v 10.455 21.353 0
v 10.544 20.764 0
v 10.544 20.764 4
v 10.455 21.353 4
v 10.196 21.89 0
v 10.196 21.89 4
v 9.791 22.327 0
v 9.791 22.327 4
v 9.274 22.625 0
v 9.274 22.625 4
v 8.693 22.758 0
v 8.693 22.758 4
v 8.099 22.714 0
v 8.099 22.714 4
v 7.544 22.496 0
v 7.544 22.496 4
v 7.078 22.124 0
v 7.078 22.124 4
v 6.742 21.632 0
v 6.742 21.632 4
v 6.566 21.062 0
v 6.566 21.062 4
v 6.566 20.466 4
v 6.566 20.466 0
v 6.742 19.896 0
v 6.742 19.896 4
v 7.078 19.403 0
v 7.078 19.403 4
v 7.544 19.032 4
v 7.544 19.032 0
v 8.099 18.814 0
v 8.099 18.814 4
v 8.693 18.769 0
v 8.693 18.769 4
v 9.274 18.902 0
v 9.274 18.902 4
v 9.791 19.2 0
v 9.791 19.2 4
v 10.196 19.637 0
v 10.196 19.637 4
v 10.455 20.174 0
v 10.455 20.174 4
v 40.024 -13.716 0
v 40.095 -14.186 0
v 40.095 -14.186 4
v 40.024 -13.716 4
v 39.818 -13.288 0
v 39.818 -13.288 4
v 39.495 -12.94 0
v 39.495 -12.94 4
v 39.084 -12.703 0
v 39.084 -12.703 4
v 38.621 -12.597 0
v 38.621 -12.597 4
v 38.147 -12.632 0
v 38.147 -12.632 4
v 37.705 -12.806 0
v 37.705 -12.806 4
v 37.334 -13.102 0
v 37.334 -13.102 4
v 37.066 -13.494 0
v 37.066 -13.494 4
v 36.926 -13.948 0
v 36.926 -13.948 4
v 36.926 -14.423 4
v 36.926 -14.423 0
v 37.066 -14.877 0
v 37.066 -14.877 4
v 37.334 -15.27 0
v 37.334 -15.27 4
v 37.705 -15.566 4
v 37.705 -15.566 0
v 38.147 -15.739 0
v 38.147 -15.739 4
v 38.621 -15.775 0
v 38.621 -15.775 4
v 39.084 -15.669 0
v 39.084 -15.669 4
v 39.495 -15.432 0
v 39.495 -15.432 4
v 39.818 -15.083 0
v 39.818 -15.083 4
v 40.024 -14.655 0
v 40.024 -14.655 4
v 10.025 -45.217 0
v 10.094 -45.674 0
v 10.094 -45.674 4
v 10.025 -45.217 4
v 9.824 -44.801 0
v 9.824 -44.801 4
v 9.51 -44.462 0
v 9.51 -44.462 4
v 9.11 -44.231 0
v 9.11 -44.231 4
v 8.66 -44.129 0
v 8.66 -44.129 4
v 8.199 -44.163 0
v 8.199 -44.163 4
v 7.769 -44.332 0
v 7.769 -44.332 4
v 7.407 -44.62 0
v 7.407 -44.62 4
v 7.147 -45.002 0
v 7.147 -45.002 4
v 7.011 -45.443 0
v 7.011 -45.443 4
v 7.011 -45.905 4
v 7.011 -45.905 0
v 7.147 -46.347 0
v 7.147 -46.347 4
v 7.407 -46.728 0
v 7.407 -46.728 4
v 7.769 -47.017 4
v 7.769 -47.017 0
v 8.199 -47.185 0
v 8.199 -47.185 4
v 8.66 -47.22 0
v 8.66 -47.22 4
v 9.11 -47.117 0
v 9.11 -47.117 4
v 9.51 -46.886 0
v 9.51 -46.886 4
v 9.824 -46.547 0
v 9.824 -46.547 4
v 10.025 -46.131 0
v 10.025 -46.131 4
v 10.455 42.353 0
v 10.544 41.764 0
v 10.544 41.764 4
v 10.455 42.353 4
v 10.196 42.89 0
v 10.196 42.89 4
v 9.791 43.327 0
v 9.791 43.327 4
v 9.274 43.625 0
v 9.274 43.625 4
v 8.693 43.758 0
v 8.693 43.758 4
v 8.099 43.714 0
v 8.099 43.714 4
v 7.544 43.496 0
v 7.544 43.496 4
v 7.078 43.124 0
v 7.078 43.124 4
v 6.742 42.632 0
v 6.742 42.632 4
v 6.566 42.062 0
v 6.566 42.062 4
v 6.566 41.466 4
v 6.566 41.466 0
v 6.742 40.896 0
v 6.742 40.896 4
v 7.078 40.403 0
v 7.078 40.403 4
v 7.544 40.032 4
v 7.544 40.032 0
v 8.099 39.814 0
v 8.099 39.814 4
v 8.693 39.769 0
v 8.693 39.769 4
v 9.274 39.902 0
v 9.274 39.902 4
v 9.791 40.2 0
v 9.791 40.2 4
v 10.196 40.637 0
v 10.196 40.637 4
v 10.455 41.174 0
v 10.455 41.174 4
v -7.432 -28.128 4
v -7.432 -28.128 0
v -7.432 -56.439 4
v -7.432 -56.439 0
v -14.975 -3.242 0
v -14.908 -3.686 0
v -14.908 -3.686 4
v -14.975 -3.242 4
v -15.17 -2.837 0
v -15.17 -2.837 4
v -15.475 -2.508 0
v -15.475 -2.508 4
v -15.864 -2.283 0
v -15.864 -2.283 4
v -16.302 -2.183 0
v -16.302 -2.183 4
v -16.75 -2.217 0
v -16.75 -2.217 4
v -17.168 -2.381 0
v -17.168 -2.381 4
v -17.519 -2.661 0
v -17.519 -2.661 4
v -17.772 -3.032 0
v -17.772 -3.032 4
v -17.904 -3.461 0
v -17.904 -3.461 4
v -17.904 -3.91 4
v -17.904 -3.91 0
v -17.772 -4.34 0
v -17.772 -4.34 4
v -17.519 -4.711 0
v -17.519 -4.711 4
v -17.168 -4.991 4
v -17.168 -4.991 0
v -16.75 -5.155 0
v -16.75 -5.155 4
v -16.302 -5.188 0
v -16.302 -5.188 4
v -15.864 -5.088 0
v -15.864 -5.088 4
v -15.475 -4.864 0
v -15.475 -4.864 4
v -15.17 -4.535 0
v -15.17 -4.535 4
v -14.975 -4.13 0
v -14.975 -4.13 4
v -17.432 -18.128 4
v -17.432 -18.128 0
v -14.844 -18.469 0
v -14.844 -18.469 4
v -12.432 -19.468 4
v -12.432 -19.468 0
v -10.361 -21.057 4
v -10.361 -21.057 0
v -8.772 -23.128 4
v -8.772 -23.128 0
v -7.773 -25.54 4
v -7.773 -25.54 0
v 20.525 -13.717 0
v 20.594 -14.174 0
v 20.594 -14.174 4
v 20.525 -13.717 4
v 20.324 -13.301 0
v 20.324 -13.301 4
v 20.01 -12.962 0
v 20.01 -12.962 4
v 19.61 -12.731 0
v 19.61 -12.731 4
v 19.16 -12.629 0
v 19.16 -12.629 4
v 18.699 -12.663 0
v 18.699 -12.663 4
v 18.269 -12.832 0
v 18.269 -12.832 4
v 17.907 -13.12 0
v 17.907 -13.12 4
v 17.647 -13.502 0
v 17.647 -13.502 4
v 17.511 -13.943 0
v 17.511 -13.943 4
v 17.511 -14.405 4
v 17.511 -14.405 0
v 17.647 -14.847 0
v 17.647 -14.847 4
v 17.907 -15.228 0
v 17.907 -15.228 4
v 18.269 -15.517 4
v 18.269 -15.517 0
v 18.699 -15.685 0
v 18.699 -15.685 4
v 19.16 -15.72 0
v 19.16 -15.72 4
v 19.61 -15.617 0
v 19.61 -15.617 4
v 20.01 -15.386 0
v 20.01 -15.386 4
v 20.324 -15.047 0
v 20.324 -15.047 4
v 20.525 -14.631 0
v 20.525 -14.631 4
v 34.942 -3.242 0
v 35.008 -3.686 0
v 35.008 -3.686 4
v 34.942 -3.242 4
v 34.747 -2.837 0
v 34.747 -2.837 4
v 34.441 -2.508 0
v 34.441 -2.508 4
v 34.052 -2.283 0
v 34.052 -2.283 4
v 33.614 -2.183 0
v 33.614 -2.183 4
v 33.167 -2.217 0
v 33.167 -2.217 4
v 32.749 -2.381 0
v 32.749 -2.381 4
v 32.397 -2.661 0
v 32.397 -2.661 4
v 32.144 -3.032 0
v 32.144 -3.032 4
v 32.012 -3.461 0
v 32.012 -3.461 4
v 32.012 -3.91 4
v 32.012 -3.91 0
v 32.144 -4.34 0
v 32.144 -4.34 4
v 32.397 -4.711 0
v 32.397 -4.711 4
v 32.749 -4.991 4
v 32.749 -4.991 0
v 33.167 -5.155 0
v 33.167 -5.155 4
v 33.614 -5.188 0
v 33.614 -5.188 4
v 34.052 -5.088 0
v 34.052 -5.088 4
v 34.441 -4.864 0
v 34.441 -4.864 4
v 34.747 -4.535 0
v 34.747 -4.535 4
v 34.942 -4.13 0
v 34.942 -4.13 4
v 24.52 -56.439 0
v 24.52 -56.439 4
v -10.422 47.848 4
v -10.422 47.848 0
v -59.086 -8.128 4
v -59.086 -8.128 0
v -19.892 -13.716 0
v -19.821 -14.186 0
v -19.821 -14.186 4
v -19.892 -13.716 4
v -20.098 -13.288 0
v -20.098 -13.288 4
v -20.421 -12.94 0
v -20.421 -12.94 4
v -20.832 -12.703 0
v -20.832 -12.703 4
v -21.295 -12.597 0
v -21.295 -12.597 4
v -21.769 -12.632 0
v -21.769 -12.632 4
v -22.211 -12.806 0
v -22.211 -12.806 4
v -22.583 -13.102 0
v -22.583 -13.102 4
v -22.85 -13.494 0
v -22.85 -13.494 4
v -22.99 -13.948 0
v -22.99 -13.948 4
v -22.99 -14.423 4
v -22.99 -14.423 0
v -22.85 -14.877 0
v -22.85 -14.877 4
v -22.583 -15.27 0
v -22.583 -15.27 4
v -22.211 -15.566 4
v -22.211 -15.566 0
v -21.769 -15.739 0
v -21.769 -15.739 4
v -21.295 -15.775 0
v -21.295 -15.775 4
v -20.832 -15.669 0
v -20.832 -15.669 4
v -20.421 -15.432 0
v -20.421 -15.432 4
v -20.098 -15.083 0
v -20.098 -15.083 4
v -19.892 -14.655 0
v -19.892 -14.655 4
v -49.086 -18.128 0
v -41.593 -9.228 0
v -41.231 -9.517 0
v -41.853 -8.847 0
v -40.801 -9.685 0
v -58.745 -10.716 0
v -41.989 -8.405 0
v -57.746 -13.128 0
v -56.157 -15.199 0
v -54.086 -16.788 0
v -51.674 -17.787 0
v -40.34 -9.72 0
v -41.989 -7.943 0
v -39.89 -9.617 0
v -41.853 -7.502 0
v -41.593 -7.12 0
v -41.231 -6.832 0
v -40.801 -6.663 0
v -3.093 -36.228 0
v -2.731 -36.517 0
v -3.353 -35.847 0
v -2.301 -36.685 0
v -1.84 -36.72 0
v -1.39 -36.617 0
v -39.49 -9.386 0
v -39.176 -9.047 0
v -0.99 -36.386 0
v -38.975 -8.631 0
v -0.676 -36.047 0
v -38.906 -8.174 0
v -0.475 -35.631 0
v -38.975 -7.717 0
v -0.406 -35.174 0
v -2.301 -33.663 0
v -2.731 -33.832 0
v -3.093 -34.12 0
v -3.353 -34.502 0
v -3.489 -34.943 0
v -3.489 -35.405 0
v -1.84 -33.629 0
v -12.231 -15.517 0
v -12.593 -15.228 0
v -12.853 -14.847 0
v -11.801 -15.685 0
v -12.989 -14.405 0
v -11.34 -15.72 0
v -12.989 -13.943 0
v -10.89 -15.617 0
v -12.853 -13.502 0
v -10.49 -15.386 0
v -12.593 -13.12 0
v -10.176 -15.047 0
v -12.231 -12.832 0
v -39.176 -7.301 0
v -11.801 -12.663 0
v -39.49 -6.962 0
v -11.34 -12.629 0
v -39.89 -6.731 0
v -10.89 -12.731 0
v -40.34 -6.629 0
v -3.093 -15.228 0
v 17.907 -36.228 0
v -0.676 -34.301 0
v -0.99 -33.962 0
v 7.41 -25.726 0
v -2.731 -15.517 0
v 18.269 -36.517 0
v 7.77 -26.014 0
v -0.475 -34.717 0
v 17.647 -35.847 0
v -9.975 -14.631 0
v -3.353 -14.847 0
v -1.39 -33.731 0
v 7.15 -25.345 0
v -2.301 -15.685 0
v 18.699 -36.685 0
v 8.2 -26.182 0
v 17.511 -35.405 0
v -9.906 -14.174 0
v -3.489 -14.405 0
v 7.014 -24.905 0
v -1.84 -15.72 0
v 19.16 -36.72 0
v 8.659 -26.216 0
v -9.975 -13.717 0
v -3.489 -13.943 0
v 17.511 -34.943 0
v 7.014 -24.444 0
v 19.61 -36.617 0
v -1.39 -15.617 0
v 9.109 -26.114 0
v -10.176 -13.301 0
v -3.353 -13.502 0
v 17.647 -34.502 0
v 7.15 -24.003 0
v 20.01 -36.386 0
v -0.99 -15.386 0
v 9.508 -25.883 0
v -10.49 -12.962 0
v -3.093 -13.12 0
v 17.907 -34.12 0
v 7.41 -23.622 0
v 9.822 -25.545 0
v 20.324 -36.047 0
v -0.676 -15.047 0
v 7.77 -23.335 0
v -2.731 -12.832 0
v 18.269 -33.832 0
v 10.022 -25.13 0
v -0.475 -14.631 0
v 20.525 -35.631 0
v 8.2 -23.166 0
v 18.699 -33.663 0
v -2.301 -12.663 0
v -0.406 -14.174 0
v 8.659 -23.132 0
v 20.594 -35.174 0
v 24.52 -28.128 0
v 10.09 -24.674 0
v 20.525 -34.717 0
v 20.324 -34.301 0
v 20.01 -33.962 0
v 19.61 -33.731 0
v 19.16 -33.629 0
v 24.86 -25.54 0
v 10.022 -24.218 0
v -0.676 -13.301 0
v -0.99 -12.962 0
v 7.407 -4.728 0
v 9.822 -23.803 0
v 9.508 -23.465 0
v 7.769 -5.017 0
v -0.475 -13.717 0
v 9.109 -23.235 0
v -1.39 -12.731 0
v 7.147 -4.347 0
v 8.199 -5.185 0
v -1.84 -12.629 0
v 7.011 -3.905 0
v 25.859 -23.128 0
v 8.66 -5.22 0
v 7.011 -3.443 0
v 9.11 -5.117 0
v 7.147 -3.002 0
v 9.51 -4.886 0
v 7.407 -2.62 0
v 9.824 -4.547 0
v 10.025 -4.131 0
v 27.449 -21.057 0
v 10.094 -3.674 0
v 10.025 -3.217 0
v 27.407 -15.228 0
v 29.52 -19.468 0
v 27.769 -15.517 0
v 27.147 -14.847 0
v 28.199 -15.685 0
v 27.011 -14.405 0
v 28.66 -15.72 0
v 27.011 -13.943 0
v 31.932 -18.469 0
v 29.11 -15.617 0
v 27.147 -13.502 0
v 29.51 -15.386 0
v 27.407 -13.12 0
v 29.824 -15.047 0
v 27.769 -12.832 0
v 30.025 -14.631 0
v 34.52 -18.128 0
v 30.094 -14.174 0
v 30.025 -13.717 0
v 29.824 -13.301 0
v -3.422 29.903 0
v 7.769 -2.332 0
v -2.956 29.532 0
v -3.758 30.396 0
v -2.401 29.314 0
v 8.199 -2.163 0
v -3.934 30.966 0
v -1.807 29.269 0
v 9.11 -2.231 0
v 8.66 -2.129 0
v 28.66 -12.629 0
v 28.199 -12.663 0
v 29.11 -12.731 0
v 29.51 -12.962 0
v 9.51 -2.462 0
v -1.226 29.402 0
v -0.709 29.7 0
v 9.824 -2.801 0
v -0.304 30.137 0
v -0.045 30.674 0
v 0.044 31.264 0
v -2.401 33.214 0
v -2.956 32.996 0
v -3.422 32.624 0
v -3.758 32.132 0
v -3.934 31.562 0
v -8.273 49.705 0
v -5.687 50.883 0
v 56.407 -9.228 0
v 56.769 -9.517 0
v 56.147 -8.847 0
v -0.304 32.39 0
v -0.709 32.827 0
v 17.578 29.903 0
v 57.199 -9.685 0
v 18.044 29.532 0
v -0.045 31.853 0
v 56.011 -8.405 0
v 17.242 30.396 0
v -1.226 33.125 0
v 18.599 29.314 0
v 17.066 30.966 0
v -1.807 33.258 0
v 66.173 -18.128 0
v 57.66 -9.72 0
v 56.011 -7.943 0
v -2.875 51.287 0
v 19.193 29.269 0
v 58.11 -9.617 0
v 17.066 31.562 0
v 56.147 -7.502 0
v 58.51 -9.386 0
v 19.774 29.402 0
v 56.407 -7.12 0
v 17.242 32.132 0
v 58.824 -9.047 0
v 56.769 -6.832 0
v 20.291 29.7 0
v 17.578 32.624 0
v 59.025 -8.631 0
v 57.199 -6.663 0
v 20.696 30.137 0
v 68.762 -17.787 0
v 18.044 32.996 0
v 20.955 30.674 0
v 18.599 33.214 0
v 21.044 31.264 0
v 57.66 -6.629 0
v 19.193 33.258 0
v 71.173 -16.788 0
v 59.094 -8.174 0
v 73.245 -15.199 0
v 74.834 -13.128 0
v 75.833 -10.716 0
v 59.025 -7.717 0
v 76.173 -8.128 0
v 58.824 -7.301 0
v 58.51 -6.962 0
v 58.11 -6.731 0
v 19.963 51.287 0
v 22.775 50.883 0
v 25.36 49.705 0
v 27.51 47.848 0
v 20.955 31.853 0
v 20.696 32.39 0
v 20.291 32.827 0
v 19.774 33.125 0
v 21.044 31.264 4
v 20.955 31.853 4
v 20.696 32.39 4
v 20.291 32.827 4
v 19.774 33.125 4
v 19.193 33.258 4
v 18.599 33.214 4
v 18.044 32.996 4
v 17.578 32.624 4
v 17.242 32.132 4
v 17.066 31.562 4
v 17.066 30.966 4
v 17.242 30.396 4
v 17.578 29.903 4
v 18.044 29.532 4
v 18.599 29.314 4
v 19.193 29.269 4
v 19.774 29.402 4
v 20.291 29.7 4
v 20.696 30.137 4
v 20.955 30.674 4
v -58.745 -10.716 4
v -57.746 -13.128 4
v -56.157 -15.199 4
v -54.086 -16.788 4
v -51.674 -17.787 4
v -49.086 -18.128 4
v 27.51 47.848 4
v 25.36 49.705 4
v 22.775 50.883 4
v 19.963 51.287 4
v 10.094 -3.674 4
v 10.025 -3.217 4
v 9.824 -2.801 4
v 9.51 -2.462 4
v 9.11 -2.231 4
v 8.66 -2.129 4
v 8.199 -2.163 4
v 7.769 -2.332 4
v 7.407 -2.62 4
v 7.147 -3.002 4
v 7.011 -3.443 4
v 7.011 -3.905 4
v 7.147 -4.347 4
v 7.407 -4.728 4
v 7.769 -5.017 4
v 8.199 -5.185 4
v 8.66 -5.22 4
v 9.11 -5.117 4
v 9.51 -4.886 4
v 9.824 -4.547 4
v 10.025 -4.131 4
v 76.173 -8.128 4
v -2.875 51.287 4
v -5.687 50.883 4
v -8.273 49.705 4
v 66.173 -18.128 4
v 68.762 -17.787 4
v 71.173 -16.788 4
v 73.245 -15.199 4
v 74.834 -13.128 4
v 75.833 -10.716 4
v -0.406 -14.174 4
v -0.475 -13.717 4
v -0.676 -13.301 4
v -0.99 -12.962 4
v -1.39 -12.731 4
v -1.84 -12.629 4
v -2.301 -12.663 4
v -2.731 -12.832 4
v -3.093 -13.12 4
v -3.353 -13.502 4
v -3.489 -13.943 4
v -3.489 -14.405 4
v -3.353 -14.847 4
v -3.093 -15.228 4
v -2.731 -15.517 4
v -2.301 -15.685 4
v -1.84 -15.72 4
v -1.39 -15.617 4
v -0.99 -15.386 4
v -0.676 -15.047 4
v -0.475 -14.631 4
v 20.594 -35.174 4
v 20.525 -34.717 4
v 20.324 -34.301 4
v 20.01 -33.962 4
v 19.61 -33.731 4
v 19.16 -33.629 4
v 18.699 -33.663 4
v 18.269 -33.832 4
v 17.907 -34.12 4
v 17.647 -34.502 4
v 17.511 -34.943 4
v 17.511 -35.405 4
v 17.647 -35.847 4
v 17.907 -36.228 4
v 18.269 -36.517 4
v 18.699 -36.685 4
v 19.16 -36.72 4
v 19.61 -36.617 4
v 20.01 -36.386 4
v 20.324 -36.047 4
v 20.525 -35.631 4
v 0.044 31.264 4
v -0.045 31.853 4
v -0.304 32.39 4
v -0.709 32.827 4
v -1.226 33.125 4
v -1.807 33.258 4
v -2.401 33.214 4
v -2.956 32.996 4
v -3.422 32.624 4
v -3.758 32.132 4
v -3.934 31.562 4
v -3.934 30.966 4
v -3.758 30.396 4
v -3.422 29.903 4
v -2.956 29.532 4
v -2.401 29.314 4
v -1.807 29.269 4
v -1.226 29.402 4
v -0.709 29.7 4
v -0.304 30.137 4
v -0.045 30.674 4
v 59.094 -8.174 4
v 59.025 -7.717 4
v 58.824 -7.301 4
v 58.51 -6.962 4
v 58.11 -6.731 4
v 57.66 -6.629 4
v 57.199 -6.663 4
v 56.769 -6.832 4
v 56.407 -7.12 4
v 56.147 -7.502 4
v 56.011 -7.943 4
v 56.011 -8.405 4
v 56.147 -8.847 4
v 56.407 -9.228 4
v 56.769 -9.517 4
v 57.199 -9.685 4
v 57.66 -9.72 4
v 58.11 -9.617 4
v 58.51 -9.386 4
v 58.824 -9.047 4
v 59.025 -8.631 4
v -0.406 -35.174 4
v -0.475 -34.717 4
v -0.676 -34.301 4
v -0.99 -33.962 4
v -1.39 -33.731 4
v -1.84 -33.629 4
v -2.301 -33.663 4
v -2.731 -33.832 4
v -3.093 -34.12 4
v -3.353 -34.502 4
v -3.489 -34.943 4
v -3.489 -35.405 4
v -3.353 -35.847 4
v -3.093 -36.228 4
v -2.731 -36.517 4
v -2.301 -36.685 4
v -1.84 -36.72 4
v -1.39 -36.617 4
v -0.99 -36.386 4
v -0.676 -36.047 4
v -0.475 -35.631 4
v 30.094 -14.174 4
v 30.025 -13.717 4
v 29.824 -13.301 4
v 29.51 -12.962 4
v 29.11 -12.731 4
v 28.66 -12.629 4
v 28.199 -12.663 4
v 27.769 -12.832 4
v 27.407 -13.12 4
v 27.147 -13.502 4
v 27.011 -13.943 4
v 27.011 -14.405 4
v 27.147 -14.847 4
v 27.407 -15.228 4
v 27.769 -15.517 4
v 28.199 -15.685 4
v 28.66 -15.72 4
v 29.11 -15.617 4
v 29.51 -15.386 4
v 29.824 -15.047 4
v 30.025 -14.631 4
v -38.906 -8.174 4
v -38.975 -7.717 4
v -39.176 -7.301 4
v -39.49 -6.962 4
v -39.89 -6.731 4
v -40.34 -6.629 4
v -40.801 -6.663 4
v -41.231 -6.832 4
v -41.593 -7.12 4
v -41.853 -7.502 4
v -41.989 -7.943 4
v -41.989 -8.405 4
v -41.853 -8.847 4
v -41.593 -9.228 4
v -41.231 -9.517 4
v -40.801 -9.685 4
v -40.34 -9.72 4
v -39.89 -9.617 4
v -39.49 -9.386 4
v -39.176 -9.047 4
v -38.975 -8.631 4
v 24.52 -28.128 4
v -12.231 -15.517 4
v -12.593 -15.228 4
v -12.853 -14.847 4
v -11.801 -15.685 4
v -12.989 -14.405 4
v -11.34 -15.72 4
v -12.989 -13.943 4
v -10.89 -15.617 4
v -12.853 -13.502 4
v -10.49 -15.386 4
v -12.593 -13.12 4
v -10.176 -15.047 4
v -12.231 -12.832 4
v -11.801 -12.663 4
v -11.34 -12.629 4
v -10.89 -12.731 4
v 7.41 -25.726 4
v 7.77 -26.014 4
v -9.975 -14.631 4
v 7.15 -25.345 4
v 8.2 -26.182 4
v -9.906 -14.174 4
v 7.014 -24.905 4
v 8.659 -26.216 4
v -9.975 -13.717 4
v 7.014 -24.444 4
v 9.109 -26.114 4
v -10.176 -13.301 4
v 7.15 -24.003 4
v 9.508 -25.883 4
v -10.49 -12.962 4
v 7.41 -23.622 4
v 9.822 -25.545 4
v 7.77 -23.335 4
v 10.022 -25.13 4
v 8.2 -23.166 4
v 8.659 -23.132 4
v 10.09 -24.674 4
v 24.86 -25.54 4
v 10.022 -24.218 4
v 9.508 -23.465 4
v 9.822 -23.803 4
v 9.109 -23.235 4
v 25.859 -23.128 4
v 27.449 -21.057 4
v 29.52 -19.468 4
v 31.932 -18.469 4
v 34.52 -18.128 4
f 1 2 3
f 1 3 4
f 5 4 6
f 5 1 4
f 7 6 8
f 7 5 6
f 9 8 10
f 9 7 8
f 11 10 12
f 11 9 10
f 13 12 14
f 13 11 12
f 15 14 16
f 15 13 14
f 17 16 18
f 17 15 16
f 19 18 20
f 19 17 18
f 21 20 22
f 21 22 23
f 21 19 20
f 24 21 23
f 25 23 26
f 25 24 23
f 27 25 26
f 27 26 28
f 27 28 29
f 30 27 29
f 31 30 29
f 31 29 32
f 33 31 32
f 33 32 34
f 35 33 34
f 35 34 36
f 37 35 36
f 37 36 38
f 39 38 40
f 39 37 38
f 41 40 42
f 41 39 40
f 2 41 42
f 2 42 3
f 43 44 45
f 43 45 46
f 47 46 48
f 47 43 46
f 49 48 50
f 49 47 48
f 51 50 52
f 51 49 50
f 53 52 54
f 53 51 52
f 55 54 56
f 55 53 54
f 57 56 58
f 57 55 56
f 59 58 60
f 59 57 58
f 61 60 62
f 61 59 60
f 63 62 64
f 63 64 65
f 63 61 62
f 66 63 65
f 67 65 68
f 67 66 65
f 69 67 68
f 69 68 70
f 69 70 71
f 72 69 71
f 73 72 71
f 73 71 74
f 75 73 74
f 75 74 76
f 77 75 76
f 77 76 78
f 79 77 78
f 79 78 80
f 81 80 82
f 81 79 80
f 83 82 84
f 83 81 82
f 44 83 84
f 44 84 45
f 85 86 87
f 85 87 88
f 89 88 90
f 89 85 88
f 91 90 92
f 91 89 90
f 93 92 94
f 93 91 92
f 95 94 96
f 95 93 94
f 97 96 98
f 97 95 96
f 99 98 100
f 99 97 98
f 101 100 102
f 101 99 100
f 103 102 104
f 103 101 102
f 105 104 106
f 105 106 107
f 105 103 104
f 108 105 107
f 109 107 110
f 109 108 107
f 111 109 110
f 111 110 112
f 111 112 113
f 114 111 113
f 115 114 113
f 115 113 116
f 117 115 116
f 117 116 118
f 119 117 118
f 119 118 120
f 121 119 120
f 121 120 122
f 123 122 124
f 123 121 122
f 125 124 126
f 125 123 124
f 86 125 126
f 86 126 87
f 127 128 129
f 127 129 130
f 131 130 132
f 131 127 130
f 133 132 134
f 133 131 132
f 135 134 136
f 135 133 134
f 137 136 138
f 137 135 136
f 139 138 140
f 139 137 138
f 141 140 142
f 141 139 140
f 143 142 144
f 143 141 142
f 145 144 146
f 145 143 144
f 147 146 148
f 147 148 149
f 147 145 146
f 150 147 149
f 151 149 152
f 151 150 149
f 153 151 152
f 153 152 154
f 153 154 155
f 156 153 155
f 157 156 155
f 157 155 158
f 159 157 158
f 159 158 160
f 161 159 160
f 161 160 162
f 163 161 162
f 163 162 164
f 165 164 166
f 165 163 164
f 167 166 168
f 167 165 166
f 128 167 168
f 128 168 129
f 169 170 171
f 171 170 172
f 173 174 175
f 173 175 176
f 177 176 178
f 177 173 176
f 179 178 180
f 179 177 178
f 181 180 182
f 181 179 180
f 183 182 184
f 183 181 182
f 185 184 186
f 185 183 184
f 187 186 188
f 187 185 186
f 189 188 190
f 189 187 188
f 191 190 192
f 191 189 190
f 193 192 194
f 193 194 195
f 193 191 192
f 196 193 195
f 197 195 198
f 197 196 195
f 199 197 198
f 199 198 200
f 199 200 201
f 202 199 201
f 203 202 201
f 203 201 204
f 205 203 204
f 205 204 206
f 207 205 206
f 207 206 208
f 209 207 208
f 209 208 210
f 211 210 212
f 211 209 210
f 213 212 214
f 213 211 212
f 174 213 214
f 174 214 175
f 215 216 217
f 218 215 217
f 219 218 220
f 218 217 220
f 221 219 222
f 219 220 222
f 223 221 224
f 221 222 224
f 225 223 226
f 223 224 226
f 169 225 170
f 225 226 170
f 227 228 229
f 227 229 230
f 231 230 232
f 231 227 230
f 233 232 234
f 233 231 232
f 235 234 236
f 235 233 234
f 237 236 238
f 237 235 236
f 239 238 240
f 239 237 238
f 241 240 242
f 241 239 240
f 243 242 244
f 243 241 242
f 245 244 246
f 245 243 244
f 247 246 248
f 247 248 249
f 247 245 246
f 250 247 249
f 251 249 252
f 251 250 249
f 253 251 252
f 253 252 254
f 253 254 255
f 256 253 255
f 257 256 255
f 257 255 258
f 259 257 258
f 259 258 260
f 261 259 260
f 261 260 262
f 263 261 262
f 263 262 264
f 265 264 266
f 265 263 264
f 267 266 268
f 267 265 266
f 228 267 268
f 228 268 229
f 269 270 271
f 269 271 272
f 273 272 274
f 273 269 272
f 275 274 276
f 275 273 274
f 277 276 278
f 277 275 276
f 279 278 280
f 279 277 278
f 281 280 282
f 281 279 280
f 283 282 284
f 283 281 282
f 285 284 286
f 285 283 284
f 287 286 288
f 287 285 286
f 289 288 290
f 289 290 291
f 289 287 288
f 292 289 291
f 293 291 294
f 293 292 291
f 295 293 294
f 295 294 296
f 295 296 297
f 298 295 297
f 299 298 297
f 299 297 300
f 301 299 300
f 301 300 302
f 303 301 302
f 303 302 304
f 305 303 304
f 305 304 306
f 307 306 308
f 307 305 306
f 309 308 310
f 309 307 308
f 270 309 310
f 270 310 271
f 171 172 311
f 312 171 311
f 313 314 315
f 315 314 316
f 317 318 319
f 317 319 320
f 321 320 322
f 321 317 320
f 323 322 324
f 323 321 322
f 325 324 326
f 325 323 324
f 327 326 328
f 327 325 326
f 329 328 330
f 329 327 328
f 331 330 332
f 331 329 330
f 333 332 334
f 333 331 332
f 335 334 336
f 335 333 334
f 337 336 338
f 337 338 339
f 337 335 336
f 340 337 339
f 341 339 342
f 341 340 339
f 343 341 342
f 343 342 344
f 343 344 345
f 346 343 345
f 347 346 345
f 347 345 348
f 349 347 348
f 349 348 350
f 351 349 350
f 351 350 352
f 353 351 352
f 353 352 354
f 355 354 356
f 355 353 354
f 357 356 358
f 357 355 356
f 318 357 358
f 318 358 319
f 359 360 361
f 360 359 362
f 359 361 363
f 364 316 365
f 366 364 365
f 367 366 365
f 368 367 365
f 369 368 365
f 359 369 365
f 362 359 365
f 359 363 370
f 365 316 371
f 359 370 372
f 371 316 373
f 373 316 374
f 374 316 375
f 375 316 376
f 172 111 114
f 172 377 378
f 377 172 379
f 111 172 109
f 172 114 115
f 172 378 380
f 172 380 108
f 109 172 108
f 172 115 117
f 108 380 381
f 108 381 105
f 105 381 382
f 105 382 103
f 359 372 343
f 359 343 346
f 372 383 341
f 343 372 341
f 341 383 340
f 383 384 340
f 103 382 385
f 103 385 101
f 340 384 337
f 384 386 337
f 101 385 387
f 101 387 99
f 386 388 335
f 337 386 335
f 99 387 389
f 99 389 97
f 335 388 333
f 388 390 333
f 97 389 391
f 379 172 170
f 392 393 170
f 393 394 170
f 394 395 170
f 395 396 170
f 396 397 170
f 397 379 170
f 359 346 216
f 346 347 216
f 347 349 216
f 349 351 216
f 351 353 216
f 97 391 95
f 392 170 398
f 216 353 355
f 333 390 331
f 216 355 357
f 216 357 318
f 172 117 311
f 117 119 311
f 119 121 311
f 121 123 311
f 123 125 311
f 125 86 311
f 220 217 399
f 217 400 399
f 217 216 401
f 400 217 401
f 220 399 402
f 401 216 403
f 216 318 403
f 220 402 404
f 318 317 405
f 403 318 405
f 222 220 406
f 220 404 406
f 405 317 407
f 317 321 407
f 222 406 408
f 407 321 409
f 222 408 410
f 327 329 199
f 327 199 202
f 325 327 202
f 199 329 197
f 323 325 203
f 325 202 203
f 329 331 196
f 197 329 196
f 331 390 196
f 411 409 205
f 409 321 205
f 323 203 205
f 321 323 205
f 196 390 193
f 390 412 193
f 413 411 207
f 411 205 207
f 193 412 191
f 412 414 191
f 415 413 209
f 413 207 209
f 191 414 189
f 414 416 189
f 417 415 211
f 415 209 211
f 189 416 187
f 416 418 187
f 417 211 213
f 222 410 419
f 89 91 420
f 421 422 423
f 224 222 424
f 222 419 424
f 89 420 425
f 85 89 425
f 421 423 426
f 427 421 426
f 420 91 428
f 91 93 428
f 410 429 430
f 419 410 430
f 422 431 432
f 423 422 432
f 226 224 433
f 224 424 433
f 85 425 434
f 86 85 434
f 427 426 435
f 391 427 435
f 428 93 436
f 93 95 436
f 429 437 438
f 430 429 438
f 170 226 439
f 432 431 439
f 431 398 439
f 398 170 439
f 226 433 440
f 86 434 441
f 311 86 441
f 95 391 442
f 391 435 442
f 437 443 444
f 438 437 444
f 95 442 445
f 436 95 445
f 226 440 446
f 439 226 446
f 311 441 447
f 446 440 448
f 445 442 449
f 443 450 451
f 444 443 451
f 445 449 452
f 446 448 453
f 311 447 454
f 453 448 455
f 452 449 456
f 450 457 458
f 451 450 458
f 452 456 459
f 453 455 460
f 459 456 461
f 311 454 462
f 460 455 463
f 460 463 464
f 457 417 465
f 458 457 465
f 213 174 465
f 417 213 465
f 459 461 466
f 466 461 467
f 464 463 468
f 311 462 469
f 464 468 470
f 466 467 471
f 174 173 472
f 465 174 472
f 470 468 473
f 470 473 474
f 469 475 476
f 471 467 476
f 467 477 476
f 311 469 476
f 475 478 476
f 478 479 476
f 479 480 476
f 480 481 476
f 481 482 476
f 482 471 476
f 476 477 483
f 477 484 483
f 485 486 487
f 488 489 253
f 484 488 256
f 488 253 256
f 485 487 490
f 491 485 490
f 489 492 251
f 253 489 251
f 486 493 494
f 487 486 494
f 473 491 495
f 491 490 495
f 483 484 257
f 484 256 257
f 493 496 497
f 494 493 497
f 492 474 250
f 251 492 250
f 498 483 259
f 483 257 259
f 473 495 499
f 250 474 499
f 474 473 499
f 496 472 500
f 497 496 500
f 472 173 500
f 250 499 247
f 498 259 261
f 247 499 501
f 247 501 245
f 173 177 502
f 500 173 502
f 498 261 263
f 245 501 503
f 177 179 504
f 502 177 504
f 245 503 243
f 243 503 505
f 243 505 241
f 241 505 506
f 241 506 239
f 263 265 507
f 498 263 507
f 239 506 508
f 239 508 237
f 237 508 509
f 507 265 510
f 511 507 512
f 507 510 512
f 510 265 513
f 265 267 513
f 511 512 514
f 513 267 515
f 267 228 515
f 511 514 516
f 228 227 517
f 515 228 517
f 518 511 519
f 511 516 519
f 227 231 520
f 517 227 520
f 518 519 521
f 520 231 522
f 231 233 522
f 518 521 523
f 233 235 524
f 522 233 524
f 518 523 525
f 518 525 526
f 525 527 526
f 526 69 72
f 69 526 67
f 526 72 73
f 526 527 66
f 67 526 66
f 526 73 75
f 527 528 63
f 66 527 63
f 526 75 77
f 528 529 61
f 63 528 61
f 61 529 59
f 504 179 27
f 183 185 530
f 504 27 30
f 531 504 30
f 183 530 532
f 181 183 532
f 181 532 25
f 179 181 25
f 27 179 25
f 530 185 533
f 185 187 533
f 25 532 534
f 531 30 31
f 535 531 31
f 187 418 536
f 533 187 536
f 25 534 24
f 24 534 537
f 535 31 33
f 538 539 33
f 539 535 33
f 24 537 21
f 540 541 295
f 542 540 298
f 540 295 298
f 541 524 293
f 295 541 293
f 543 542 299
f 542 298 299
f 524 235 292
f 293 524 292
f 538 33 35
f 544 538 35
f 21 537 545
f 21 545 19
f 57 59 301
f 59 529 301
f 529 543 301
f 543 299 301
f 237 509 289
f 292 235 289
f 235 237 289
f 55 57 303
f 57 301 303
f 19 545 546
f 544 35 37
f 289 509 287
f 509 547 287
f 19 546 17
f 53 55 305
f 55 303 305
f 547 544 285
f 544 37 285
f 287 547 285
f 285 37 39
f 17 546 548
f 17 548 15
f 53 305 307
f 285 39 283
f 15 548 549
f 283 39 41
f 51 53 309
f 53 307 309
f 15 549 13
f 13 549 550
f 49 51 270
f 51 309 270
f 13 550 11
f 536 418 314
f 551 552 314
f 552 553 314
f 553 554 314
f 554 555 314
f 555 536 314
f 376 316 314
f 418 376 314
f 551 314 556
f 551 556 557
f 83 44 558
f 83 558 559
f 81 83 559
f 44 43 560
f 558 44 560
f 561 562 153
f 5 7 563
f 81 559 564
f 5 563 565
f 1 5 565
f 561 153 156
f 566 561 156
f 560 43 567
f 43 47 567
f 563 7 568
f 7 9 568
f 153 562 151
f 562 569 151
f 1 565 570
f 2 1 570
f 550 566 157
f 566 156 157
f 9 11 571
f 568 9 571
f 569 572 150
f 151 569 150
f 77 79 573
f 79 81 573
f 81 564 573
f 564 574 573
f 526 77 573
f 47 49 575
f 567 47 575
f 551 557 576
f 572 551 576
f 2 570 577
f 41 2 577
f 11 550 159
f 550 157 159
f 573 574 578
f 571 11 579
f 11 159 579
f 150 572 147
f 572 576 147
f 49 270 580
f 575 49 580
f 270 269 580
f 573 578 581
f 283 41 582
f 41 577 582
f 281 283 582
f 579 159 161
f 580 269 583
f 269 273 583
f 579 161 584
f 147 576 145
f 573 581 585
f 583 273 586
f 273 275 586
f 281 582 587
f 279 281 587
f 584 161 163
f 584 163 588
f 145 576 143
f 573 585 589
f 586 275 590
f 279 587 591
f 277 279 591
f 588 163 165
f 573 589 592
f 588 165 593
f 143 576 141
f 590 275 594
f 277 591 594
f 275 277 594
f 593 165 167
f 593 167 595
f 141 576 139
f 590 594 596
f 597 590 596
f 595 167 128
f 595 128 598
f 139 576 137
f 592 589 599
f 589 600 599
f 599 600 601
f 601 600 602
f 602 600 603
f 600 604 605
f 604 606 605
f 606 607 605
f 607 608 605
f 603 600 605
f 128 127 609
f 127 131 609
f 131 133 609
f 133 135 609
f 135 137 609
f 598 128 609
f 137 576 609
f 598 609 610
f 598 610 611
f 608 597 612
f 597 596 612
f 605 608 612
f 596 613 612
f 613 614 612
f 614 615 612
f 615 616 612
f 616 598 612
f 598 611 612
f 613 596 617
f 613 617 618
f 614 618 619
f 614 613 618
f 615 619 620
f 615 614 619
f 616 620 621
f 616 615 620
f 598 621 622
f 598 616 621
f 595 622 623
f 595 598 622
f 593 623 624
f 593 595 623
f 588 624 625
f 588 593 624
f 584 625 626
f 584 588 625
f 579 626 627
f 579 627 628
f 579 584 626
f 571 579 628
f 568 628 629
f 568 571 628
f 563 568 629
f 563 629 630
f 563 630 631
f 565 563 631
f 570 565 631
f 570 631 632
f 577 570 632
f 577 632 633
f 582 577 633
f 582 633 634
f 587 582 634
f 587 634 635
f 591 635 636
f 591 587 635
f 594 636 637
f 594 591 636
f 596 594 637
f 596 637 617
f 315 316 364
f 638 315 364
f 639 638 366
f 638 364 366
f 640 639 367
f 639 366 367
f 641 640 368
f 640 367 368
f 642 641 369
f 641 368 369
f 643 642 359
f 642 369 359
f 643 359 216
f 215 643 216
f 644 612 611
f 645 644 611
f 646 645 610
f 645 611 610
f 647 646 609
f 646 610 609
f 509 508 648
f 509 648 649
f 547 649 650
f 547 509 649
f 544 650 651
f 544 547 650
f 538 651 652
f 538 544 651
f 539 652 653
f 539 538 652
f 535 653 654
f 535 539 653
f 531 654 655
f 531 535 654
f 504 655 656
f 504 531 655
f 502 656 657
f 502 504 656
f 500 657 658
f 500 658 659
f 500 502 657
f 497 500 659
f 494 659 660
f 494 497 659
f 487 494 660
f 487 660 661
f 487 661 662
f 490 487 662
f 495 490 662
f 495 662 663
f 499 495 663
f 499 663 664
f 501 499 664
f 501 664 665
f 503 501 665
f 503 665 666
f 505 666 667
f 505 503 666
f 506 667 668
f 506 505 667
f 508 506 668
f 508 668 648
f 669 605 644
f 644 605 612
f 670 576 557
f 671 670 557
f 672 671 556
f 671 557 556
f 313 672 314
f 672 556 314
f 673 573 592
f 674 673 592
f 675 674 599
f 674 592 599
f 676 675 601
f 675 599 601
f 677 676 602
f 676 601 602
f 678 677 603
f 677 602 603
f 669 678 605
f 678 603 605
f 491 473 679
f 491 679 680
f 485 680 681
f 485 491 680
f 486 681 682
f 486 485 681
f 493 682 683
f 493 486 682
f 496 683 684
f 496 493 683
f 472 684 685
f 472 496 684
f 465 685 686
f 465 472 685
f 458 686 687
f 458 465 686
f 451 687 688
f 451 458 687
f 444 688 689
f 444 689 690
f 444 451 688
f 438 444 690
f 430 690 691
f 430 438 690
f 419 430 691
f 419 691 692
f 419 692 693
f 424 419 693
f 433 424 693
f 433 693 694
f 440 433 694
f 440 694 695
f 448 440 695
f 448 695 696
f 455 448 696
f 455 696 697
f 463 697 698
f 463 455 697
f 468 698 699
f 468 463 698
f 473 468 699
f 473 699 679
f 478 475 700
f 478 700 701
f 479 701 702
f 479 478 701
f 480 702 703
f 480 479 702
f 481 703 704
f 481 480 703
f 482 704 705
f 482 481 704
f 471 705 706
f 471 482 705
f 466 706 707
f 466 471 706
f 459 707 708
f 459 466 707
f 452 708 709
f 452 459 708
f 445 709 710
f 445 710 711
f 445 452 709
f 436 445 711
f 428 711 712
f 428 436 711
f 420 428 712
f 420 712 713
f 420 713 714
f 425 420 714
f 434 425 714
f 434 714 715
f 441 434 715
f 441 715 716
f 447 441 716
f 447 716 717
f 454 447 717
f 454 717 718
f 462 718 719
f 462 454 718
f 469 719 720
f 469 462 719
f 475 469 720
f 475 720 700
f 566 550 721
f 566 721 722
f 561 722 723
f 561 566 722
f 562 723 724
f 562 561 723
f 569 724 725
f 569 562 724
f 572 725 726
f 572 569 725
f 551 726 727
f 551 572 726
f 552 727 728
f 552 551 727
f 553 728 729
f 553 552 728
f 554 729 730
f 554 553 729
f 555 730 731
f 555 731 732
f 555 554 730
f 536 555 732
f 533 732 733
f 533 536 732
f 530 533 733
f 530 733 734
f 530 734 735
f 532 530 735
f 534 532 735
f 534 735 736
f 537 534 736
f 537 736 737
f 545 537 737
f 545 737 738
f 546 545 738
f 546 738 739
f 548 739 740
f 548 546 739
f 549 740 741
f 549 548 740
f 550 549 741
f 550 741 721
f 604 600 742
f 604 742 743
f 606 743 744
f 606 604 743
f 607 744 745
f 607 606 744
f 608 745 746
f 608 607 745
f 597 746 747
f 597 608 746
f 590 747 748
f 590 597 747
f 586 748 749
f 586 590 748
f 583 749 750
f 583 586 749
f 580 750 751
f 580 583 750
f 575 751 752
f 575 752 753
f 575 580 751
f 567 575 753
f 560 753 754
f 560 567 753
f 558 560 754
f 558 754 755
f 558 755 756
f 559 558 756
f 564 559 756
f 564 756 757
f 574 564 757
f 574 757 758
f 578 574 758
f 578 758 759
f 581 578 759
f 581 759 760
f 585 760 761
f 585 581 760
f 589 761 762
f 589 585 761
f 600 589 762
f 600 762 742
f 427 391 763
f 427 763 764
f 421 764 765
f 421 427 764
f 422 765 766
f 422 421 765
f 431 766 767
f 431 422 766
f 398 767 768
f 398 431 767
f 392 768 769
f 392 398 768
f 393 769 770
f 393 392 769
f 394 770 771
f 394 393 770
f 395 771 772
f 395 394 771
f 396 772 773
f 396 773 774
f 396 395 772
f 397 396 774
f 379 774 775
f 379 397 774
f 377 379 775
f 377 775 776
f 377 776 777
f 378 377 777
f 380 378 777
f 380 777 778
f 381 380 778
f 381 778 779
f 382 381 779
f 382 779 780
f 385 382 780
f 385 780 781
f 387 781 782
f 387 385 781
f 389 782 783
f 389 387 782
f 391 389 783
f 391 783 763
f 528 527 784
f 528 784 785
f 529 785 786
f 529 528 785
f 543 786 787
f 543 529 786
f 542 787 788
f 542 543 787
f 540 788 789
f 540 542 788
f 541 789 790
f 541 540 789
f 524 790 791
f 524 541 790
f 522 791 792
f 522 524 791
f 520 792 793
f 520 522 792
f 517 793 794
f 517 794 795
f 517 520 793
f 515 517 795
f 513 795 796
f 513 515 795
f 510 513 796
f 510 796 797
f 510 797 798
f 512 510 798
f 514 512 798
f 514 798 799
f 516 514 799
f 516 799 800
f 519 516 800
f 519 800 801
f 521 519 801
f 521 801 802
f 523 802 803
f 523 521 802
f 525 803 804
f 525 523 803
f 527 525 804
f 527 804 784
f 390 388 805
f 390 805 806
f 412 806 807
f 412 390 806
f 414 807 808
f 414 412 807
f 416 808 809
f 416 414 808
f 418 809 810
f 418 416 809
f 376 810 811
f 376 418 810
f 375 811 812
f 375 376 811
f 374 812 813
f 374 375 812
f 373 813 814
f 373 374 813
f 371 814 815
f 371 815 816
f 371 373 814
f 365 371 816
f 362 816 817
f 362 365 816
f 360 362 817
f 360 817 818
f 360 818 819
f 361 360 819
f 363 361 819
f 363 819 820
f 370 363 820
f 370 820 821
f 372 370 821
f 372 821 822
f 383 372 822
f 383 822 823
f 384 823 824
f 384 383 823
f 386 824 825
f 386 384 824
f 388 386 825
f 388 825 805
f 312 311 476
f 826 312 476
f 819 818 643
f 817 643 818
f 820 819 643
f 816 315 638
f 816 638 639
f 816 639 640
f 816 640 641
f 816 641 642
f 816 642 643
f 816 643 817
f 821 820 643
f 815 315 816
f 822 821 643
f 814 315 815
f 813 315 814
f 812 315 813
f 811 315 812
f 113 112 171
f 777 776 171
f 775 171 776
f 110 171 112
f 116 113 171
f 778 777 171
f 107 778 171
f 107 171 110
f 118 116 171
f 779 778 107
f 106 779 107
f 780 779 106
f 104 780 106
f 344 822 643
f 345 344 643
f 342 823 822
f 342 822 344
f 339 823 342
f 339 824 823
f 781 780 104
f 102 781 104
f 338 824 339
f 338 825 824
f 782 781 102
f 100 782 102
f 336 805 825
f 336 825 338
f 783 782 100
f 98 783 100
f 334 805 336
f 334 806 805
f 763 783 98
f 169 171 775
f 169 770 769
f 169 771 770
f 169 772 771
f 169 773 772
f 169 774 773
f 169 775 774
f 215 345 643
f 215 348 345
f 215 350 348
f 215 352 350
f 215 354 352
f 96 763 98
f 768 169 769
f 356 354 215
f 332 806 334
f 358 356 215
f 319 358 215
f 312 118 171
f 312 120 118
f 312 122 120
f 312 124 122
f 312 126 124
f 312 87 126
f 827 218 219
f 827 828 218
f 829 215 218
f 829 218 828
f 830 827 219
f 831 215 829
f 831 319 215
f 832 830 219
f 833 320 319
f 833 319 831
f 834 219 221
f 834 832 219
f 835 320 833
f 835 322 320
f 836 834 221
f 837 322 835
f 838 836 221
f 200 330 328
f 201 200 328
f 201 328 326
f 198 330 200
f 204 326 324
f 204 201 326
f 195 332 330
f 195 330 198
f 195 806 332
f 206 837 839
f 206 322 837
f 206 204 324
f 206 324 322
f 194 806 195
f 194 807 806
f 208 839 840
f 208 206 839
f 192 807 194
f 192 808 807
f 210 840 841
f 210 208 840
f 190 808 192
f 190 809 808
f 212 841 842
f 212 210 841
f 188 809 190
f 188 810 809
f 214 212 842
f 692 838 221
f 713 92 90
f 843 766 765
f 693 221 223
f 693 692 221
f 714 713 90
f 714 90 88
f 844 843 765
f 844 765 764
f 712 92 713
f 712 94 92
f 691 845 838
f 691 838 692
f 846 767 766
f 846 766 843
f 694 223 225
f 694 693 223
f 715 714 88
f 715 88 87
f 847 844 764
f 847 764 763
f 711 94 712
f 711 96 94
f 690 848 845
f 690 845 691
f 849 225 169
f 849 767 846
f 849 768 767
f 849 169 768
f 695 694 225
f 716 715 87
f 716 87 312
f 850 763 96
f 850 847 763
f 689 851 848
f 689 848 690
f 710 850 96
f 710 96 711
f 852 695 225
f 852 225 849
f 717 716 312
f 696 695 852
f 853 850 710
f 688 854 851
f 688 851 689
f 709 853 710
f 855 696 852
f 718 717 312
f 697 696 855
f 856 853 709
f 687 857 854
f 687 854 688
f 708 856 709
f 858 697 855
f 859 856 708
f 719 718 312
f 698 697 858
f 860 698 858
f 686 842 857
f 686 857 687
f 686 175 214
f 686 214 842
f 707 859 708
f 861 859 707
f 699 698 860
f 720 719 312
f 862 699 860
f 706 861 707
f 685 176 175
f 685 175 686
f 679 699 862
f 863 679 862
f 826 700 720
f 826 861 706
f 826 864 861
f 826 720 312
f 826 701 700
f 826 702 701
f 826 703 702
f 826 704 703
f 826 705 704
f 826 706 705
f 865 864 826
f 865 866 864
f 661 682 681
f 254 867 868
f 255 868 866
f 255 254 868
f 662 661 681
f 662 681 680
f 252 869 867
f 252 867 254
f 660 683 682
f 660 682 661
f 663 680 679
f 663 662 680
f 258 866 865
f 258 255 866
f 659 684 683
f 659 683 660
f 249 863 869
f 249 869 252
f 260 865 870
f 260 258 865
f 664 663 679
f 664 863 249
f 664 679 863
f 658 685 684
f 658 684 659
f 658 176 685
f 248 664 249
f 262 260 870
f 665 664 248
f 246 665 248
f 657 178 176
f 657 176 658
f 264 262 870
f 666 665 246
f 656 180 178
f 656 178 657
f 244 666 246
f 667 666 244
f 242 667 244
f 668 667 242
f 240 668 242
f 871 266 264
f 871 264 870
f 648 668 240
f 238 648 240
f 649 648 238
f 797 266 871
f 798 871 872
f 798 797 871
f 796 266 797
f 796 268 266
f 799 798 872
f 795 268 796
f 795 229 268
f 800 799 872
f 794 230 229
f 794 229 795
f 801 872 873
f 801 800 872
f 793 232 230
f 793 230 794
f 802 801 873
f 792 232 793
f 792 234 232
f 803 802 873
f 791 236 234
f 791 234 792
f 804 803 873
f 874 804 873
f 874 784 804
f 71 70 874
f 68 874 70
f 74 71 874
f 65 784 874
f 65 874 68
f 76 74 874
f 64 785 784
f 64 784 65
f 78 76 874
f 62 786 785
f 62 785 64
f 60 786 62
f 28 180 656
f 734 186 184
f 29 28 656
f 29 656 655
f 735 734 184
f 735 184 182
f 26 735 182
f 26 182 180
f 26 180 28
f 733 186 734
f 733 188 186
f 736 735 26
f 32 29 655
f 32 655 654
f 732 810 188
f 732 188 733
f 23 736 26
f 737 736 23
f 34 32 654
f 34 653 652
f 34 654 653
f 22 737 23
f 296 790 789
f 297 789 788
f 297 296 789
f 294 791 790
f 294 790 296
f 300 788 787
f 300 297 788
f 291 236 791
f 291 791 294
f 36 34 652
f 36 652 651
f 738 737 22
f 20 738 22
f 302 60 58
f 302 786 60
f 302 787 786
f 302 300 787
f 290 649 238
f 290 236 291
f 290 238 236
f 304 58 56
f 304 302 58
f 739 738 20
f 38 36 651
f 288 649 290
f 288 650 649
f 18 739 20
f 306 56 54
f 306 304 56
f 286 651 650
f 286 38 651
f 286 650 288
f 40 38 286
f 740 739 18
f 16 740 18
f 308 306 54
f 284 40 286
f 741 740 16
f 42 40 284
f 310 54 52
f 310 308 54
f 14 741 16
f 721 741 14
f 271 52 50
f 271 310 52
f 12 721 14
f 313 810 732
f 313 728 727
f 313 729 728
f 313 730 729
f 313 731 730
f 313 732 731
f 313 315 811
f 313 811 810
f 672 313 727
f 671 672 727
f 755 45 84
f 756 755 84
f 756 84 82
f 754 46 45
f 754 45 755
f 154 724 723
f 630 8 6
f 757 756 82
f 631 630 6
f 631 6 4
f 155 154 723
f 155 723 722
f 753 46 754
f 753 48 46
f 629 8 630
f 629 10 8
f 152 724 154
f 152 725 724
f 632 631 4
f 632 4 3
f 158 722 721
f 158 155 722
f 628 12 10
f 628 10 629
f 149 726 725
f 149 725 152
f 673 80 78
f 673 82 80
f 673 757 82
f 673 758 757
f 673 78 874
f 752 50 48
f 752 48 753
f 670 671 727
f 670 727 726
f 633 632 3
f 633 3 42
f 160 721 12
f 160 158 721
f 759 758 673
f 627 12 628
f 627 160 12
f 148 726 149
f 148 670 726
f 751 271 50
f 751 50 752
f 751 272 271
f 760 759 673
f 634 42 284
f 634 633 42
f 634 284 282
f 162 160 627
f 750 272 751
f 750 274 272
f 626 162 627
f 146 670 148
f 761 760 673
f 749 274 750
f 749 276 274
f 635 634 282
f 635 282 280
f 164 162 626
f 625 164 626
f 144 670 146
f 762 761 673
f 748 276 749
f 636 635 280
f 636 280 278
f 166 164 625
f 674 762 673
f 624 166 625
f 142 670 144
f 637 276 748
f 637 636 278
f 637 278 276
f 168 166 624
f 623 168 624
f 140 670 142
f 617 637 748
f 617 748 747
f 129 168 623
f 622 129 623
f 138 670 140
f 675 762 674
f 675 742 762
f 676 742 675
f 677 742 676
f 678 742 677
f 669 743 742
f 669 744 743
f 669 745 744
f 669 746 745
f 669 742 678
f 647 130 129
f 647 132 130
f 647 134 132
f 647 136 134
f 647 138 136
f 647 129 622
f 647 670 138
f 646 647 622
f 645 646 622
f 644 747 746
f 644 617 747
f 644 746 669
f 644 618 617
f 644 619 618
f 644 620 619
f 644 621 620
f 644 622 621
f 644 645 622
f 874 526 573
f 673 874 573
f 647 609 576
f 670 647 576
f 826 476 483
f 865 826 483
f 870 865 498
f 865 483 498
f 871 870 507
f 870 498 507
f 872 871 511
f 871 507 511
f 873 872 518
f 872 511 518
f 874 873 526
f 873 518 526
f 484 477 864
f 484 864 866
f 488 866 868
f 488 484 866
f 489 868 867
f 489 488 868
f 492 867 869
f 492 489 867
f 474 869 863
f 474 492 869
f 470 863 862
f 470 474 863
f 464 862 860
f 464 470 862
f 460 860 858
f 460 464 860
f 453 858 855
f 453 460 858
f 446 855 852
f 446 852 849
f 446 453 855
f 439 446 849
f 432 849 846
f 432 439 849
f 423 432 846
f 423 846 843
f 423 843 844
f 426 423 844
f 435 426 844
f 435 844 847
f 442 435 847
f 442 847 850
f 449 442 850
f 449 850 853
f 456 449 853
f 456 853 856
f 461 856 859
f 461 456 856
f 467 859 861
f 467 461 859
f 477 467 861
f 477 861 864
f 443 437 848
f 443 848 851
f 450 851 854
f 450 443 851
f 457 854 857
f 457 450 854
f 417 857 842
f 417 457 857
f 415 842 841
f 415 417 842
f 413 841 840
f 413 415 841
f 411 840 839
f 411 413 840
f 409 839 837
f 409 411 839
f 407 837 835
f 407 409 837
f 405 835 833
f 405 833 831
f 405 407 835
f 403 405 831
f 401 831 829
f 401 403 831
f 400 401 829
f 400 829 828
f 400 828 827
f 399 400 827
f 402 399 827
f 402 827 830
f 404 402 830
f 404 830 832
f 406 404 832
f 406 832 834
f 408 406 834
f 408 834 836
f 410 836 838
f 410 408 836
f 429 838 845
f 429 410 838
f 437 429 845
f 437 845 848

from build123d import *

# Parameters (mm, degrees)
SKETCH_1_R      = 1.55
SKETCH_1_R_2    = 1.593407699
SKETCH_1_R_3    = 1.506592301
SKETCH_1_R_4    = 1.546583653
SKETCH_1_R_5    = 2
EXTRUDE_1_DEPTH = 4


with BuildPart() as part:
    # 草图1 → 凸台-拉伸1 (new body)
    with BuildSketch(Plane.XY):
        with BuildLine():
            Line((-49.086064172, -18.127823684), (-41.682309555, -18.127823684))
            Line((-41.682309555, -18.127823684), (-17.432309555, -18.127823684))
            ThreePointArc((-17.432309555, -18.127823684), (-10.361241743, -21.056755872), (-7.432309555, -28.127823684))
            Line((-7.432309555, -28.127823684), (-7.432309555, -56.439146577))
            Line((-7.432309555, -56.439146577), (24.519698232, -56.439146577))
            Line((24.519698232, -56.439146577), (24.519698232, -28.127823684))
            ThreePointArc((24.519698232, -28.127823684), (27.44863042, -21.056755872), (34.519698232, -18.127823684))
            Line((34.519698232, -18.127823684), (58.769698232, -18.127823684))
            Line((58.769698232, -18.127823684), (66.173452848, -18.127823684))
            ThreePointArc((66.173452848, -18.127823684), (73.24452066, -15.198891495), (76.173452848, -8.127823684))
            Line((76.173452848, -8.127823684), (27.509504294, 47.847762189))
            ThreePointArc((27.509504294, 47.847762189), (24.109445562, 50.386499783), (19.962749895, 51.28677918))
            Line((19.962749895, 51.28677918), (8.543694338, 51.28677918))
            Line((8.543694338, 51.28677918), (-2.875361218, 51.28677918))
            ThreePointArc((-2.875361218, 51.28677918), (-7.022056885, 50.386499783), (-10.422115617, 47.847762189))
            Line((-10.422115617, 47.847762189), (-59.086064172, -8.127823684))
            ThreePointArc((-59.086064172, -8.127823684), (-56.157131983, -15.198891495), (-49.086064172, -18.127823684))
        make_face()
        with Locations((-1.956305662, -35.174209618)):
            Circle(SKETCH_1_R, mode=Mode.SUBTRACT)
        with Locations((-40.456305662, -8.174209618)):
            Circle(SKETCH_1_R, mode=Mode.SUBTRACT)
        with Locations((-21.414481972, -14.185828882)):
            Circle(SKETCH_1_R_2, mode=Mode.SUBTRACT)
        with Locations((-11.456305662, -14.174209618)):
            Circle(SKETCH_1_R, mode=Mode.SUBTRACT)
        with Locations((-16.414481972, -3.685828882)):
            Circle(SKETCH_1_R_3, mode=Mode.SUBTRACT)
        with Locations((-1.956305662, -14.174209618)):
            Circle(SKETCH_1_R, mode=Mode.SUBTRACT)
        with Locations((8.543694338, -45.674209618)):
            Circle(SKETCH_1_R, mode=Mode.SUBTRACT)
        with Locations((19.043694338, -35.174209618)):
            Circle(SKETCH_1_R, mode=Mode.SUBTRACT)
        with Locations((8.543694338, -24.674209618)):
            Circle(SKETCH_1_R_4, mode=Mode.SUBTRACT)
        with Locations((19.043694338, -14.174209618)):
            Circle(SKETCH_1_R, mode=Mode.SUBTRACT)
        with Locations((8.543694338, -3.674209618)):
            Circle(SKETCH_1_R, mode=Mode.SUBTRACT)
        with Locations((28.543694338, -14.174209618)):
            Circle(SKETCH_1_R, mode=Mode.SUBTRACT)
        with Locations((38.501870648, -14.185828882)):
            Circle(SKETCH_1_R_2, mode=Mode.SUBTRACT)
        with Locations((33.501870648, -3.685828882)):
            Circle(SKETCH_1_R_3, mode=Mode.SUBTRACT)
        with Locations((57.543694338, -8.174209618)):
            Circle(SKETCH_1_R, mode=Mode.SUBTRACT)
        with Locations((-1.956305662, 31.263738804)):
            Circle(SKETCH_1_R_5, mode=Mode.SUBTRACT)
        with Locations((8.543694338, 20.763738804)):
            Circle(SKETCH_1_R_5, mode=Mode.SUBTRACT)
        with Locations((19.043694338, 31.263738804)):
            Circle(SKETCH_1_R_5, mode=Mode.SUBTRACT)
        with Locations((8.543694338, 41.763738804)):
            Circle(SKETCH_1_R_5, mode=Mode.SUBTRACT)
    extrude(amount=EXTRUDE_1_DEPTH)


solid = part.part
